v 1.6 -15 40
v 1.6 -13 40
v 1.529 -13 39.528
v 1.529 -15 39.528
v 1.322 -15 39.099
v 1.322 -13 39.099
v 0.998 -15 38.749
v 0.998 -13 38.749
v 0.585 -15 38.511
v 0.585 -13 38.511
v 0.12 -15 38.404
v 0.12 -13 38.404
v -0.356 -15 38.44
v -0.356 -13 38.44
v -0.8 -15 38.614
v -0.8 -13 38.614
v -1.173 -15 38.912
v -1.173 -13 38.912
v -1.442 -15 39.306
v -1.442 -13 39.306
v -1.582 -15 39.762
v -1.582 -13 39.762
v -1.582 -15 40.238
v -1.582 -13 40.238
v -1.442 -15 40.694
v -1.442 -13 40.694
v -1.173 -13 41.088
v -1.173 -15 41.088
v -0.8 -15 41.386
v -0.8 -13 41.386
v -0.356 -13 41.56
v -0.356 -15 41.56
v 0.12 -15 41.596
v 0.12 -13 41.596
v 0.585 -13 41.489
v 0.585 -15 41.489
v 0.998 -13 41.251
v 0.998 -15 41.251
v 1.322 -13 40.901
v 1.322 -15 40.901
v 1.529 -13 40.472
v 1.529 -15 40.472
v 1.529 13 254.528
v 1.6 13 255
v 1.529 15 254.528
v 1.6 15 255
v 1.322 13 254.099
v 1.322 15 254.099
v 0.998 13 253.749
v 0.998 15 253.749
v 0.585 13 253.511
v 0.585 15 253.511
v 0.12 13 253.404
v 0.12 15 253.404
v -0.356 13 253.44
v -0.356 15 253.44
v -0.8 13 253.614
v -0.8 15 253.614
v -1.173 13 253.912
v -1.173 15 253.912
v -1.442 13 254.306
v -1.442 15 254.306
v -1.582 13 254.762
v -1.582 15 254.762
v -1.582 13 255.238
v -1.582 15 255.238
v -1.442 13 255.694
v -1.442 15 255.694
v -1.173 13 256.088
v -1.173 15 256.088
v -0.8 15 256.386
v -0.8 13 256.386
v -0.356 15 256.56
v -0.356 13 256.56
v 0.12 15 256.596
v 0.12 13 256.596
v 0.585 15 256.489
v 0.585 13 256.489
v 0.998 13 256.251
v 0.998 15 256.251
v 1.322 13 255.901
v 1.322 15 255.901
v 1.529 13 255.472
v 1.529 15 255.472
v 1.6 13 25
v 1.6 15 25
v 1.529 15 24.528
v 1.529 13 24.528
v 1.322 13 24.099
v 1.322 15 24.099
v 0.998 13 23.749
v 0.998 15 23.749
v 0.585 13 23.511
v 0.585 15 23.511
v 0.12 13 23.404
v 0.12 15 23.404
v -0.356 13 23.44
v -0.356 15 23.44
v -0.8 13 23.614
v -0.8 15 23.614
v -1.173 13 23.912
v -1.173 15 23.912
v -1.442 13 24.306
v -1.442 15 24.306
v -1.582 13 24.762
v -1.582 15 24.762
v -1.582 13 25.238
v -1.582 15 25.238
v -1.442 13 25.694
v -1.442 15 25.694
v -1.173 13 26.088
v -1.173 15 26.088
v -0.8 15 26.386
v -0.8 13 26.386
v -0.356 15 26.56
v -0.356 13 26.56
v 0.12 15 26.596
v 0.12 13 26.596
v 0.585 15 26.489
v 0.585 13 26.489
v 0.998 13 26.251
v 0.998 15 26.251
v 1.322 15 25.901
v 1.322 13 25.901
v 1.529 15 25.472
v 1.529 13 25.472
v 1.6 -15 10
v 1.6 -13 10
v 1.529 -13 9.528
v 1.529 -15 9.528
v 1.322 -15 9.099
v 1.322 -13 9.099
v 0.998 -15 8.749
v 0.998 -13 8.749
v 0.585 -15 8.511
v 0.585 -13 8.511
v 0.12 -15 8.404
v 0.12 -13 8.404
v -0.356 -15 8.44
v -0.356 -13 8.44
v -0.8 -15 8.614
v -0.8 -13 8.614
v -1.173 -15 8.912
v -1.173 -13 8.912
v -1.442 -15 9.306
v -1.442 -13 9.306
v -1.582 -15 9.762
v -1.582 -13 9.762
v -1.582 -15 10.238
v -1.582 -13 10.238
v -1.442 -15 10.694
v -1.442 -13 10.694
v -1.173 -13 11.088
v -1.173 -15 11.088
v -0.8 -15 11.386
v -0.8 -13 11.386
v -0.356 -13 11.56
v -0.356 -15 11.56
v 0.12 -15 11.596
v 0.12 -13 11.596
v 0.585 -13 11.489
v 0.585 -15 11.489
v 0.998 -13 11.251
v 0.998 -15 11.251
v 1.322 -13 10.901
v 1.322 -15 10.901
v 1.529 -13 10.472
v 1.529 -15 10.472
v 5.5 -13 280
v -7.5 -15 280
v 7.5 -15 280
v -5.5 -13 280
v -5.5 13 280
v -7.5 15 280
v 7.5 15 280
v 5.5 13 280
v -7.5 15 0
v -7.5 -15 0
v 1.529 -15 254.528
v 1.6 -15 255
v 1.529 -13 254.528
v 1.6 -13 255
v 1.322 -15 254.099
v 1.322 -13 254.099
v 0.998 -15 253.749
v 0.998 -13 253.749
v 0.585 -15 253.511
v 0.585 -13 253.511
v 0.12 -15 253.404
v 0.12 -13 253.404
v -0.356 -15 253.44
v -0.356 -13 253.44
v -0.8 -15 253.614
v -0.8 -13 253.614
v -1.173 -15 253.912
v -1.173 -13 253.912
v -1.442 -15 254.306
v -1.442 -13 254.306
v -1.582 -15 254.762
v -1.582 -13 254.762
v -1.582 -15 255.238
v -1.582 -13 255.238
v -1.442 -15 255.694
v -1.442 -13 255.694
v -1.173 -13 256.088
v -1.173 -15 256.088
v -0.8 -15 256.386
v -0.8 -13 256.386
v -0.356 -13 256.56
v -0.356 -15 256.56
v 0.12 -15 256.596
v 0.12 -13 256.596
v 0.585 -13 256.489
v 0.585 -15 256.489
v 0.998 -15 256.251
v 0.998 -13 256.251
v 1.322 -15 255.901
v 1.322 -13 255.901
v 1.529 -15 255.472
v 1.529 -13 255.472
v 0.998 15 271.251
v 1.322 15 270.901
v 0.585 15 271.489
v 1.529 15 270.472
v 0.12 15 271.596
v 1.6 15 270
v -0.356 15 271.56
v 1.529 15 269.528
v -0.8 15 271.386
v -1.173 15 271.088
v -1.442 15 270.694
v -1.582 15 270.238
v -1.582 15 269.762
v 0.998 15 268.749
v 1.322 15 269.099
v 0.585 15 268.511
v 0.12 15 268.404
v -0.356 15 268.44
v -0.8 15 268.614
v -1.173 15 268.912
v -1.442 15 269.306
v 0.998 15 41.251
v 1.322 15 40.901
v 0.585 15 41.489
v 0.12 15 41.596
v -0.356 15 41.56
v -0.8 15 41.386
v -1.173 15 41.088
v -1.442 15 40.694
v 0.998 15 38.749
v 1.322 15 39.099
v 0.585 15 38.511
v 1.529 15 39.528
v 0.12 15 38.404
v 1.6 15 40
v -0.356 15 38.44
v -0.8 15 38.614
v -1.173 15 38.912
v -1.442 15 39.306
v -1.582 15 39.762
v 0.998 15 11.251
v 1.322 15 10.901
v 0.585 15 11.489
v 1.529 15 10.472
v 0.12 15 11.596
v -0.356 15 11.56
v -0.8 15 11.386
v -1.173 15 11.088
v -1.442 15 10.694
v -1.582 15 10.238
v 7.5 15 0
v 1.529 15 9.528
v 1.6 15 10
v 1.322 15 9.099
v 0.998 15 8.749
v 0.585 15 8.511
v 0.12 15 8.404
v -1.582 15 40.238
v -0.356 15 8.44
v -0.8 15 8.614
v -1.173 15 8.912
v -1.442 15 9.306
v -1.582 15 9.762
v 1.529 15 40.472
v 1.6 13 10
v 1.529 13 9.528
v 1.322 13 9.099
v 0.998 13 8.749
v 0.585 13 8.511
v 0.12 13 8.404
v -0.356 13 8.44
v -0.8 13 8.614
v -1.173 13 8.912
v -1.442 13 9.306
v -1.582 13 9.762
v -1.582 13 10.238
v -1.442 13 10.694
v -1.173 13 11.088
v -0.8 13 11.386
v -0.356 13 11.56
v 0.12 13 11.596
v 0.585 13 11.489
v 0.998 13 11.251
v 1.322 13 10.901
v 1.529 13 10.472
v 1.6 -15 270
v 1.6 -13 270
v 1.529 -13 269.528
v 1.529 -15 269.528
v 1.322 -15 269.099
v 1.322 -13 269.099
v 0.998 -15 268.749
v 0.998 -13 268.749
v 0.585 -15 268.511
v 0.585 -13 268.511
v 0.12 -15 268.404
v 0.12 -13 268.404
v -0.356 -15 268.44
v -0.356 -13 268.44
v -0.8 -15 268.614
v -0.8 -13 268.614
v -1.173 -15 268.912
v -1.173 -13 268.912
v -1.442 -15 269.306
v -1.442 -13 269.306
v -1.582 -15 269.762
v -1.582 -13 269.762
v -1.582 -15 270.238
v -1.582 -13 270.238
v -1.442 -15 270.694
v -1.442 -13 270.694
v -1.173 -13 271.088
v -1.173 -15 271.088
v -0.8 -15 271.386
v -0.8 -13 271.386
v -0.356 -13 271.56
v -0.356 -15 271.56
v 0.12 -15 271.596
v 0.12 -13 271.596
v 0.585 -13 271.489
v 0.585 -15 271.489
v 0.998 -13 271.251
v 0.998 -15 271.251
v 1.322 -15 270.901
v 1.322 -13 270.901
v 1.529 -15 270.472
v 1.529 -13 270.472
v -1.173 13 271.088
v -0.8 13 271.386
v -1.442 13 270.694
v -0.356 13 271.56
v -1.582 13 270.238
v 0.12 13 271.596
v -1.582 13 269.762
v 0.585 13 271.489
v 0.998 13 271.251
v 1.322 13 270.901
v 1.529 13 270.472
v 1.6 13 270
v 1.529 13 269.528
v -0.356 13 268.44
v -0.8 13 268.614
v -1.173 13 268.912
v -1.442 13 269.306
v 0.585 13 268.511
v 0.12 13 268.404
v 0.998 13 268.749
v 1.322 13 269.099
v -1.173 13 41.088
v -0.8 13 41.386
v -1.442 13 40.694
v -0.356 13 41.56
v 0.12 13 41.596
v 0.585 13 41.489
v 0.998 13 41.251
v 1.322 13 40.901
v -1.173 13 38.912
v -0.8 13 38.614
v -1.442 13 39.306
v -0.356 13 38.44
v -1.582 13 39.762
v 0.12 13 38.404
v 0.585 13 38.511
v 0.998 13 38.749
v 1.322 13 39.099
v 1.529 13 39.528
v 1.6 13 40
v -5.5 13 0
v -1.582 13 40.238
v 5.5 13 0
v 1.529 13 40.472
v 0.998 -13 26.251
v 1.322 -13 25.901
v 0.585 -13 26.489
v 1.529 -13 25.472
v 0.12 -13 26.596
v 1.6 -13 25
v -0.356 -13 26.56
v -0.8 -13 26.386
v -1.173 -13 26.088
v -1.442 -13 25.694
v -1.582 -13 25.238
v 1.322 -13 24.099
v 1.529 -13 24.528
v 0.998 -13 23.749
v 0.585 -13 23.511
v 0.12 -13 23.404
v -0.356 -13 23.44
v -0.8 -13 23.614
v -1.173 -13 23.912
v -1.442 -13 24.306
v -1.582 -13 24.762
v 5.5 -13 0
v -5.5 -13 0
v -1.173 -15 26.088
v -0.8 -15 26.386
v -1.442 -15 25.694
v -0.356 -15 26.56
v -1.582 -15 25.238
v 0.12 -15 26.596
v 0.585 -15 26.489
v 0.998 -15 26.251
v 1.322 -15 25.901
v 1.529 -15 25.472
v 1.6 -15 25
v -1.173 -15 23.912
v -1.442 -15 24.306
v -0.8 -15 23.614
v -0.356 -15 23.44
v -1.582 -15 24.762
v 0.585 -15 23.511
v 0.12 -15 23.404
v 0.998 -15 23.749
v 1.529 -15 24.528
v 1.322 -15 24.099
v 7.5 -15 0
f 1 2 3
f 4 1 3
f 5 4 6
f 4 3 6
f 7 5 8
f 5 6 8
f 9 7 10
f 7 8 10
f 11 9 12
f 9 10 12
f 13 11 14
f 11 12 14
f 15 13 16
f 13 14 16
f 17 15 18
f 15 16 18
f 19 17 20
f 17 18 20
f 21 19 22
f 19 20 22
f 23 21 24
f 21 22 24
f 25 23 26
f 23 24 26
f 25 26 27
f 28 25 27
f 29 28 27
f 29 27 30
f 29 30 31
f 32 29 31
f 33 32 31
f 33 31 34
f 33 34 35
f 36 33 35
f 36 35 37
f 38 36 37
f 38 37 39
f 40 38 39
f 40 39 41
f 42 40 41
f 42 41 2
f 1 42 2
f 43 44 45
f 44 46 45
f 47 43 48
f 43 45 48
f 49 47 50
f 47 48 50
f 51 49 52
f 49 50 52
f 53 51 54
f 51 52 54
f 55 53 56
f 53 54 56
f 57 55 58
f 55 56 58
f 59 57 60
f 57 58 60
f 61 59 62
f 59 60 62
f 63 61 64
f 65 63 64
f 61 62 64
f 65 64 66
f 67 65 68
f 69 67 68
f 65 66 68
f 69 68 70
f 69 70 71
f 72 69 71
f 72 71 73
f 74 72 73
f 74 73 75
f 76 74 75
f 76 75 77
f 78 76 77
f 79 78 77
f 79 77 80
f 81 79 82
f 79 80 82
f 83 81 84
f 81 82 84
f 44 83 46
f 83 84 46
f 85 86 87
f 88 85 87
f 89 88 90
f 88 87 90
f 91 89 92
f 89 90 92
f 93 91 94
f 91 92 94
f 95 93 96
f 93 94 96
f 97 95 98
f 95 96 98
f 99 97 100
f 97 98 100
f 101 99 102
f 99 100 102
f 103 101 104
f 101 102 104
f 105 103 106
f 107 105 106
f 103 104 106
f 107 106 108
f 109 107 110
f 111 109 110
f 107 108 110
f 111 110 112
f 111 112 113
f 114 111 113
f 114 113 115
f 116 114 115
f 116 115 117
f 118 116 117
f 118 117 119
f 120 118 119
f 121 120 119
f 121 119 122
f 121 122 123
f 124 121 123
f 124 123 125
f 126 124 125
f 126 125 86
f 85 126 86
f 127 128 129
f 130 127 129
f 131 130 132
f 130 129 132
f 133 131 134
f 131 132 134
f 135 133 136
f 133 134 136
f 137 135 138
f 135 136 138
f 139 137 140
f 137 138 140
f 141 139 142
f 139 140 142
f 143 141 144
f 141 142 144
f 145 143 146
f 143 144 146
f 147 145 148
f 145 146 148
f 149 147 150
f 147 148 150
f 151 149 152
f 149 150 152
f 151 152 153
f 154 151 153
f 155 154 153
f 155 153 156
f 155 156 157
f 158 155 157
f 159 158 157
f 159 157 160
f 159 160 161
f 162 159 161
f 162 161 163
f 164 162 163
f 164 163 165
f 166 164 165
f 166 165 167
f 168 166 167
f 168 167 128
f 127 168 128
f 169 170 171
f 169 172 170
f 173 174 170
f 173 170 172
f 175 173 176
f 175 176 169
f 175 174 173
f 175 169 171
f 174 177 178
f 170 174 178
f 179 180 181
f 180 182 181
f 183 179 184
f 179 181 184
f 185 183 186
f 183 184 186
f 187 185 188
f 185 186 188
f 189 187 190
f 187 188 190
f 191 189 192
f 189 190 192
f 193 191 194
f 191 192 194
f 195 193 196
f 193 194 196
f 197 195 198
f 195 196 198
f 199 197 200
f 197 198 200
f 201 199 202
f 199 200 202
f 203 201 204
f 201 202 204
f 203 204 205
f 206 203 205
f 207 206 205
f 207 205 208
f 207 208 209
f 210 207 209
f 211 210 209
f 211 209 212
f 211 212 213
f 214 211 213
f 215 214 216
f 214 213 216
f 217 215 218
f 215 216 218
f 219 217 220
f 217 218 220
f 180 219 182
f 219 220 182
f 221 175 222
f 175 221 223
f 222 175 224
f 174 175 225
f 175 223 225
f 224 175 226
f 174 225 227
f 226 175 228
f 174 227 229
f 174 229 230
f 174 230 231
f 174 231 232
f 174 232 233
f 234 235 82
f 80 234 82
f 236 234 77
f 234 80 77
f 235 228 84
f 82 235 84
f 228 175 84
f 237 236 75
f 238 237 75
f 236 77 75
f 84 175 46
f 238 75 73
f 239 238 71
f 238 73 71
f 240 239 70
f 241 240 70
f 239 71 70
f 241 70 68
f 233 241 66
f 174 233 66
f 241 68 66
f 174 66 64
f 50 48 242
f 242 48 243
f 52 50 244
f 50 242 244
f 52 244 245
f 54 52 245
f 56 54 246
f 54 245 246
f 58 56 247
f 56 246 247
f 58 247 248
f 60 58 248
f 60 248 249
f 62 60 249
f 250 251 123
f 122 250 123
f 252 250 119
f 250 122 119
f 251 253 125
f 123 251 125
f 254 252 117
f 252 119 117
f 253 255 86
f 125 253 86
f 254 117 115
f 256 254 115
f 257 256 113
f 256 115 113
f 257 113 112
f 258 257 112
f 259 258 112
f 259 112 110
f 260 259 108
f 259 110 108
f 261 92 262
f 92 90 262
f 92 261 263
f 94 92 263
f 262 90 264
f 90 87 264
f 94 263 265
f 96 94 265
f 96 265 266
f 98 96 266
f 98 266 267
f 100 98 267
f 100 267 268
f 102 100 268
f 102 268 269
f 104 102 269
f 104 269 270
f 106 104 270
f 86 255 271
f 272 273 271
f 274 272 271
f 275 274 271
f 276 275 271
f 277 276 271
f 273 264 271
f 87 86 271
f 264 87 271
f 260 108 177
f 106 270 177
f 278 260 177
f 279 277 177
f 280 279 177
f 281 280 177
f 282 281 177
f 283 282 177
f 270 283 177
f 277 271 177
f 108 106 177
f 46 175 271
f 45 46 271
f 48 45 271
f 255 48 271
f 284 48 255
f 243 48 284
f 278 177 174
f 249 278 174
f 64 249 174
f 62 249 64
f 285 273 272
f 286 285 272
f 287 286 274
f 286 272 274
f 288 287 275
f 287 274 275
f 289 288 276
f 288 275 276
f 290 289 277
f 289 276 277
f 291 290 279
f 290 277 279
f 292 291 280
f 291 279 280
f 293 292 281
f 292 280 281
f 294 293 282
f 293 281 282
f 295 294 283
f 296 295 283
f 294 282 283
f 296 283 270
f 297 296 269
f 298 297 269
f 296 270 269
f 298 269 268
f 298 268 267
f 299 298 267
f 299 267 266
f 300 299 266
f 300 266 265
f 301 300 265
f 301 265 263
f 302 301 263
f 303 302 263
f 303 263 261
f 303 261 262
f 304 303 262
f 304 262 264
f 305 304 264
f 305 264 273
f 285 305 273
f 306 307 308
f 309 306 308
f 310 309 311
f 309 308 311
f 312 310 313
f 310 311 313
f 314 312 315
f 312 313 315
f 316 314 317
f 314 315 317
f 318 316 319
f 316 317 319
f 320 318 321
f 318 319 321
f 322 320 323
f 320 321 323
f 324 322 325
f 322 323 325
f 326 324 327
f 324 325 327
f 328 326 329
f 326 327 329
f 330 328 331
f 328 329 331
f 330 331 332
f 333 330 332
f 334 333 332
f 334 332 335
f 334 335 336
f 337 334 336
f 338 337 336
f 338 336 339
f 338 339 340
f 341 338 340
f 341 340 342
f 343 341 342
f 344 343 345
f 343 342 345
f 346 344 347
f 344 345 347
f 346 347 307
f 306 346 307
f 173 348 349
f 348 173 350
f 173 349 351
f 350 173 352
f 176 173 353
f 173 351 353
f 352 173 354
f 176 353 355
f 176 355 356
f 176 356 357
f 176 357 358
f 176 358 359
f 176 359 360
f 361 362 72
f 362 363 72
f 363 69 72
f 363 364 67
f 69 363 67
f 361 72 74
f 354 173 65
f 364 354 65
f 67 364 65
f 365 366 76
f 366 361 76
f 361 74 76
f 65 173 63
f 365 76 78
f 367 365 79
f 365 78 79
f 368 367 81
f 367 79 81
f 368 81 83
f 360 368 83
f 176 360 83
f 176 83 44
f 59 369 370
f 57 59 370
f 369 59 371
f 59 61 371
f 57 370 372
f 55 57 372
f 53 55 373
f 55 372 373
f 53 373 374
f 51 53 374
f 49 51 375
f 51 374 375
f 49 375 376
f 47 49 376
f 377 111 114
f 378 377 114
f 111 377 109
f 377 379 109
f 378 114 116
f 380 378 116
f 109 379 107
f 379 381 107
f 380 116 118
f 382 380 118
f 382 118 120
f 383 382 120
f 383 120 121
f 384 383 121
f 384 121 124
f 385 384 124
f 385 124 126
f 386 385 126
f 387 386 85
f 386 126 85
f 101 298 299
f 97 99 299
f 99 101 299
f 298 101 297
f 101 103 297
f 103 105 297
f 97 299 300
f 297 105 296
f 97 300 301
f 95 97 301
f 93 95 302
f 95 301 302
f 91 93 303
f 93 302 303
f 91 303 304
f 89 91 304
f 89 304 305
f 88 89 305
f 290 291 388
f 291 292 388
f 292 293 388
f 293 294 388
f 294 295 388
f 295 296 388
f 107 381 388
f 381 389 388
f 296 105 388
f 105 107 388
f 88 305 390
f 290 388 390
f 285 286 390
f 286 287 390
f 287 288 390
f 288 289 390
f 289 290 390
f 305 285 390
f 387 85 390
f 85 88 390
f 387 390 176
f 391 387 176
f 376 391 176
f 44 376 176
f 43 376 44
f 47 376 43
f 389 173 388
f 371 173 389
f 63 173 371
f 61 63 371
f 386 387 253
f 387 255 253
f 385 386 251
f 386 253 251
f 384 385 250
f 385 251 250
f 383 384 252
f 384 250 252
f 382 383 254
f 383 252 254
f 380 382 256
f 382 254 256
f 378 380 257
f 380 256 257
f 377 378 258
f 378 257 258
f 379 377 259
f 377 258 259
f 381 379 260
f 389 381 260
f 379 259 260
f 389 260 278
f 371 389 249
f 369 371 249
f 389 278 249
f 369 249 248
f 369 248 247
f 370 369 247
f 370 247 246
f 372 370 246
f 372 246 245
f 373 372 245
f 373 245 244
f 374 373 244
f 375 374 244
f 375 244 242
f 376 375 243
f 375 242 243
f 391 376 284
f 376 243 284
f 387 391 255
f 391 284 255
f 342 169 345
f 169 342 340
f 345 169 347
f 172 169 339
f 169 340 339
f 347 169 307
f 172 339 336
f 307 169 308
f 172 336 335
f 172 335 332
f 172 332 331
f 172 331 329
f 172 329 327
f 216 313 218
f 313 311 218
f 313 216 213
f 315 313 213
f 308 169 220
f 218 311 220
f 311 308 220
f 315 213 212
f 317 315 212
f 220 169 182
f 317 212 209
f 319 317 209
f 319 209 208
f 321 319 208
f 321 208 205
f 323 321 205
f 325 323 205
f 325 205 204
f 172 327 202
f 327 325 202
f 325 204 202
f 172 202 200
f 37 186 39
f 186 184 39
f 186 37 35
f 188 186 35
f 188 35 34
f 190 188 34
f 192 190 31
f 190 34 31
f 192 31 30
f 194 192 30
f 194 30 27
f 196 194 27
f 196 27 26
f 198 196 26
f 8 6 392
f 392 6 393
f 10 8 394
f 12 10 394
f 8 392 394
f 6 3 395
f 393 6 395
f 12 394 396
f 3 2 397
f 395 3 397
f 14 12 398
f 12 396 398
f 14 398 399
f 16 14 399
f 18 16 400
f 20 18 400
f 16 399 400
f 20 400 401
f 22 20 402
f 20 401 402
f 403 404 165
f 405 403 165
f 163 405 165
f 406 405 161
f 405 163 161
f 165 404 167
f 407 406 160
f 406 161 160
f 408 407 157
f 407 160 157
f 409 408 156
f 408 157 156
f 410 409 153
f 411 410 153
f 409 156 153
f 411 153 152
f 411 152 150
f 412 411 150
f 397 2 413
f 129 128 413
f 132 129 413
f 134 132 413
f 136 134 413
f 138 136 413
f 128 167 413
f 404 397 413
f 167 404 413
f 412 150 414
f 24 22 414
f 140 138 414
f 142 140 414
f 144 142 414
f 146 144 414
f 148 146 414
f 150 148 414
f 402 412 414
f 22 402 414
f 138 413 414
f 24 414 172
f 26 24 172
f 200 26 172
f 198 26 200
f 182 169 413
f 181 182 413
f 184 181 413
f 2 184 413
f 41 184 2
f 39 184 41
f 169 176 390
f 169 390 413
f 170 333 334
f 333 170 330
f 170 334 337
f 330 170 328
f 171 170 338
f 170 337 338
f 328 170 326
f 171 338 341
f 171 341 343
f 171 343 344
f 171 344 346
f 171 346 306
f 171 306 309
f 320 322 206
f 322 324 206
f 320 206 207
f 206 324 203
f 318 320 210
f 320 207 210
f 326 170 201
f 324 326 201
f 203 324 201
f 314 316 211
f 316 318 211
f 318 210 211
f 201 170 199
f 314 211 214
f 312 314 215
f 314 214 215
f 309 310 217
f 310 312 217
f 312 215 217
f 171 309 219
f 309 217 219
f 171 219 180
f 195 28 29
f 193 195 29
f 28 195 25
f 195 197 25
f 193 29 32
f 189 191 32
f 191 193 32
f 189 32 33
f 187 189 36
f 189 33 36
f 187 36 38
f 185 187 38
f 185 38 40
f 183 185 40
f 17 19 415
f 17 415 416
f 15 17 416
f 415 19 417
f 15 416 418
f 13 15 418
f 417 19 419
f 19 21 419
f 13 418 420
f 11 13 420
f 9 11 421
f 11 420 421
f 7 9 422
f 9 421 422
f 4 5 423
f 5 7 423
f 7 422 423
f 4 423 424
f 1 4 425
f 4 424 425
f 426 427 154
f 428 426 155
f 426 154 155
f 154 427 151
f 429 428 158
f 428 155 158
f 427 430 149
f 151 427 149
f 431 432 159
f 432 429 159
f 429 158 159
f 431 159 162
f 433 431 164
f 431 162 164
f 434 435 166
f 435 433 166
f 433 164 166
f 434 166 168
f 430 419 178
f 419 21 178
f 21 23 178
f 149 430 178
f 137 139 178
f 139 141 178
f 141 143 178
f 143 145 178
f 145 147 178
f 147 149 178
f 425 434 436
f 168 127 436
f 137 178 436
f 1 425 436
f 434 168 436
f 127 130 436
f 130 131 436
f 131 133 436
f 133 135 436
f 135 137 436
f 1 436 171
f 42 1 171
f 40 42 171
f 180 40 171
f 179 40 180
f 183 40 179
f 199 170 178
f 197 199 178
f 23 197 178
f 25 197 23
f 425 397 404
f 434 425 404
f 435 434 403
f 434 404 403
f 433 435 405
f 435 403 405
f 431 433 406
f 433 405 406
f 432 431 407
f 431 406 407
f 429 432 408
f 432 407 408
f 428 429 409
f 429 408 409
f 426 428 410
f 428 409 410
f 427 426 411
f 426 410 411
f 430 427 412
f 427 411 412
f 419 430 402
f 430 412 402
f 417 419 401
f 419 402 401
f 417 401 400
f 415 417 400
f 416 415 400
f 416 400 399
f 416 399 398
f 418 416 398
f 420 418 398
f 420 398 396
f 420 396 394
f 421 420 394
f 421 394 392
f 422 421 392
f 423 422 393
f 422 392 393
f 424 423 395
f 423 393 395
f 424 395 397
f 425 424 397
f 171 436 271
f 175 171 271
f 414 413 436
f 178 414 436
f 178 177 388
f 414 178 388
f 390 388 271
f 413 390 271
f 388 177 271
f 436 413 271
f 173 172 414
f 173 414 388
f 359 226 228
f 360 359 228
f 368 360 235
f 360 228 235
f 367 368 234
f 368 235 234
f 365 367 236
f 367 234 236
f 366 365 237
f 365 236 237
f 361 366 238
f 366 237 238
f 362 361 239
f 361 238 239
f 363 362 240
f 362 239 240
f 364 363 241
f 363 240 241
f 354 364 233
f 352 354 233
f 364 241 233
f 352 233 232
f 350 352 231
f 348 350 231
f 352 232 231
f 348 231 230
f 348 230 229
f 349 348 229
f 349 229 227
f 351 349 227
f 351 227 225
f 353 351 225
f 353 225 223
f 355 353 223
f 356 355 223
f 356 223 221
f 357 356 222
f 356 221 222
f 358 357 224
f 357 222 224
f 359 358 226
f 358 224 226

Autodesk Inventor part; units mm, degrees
ref_plane "YZ Plane" through (0, 0, 0) normal (1, 0, 0) x (0, 1, 0)
ref_plane "XZ Plane" through (0, 0, 0) normal (0, 1, 0) x (-1, 0, 0)
ref_plane "XY Plane" through (0, 0, 0) normal (0, 0, 1) x (1, 0, 0)
sketch "スケッチ1" plane through (0, 0, 0) normal (0, 0, 1) x (1, 0, 0)
  line L0 (7.5, 15) -> (-7.5, 15)
  line L1 (-7.5, 15) -> (-7.5, -15)
  line L2 (-7.5, -15) -> (7.5, -15)
  line L3 (7.5, -15) -> (7.5, 15)
  line L4 (7.5, 15) -> (-7.5, -15) construction
  line L5 (-7.5, 15) -> (7.5, -15) construction
  line L6 (-5.5, 13) -> (5.5, 13)
  line L7 (5.5, 13) -> (5.5, -13)
  line L8 (5.5, -13) -> (-5.5, -13)
  line L9 (-5.5, -13) -> (-5.5, 13)
  point P0 (0, 0)
  dimension "d0" = 15
  dimension "d1" = 30
  dimension "d2" = 2
extrude "押し出し1" add sketch "スケッチ1" along normal blind 280
sketch "スケッチ2" plane through (-7.5, 15, 0) normal (0, 1, 0) x (1, 0, 0)
  circle A0 centre (7.5, -10) radius 1.6
  circle A1 centre (7.5, -25) radius 1.6
  circle A2 centre (7.5, -40) radius 1.6
  line L0 (15, 0) -> (0, 0) projected
  circle A3 centre (7.5, -270) radius 1.6
  circle A4 centre (7.5, -255) radius 1.6
  line L1 (15, -280) -> (0, -280) projected
  point P0 (7.5, 0)
  point P1 (7.5, 0)
  dimension "d5" = 3.2
  dimension "d6" = 3.2
  dimension "d7" = 3.2
  dimension "d8" = 10
  dimension "d9" = 15
  dimension "d10" = 15
  dimension "d11" = 3.2
  dimension "d12" = 3.2
  dimension "d13" = 10
  dimension "d14" = 15
extrude "押し出し2" cut sketch "スケッチ2" against normal through all
properties part number "オムニ_角柱2" material "アルミニウム 6061"
